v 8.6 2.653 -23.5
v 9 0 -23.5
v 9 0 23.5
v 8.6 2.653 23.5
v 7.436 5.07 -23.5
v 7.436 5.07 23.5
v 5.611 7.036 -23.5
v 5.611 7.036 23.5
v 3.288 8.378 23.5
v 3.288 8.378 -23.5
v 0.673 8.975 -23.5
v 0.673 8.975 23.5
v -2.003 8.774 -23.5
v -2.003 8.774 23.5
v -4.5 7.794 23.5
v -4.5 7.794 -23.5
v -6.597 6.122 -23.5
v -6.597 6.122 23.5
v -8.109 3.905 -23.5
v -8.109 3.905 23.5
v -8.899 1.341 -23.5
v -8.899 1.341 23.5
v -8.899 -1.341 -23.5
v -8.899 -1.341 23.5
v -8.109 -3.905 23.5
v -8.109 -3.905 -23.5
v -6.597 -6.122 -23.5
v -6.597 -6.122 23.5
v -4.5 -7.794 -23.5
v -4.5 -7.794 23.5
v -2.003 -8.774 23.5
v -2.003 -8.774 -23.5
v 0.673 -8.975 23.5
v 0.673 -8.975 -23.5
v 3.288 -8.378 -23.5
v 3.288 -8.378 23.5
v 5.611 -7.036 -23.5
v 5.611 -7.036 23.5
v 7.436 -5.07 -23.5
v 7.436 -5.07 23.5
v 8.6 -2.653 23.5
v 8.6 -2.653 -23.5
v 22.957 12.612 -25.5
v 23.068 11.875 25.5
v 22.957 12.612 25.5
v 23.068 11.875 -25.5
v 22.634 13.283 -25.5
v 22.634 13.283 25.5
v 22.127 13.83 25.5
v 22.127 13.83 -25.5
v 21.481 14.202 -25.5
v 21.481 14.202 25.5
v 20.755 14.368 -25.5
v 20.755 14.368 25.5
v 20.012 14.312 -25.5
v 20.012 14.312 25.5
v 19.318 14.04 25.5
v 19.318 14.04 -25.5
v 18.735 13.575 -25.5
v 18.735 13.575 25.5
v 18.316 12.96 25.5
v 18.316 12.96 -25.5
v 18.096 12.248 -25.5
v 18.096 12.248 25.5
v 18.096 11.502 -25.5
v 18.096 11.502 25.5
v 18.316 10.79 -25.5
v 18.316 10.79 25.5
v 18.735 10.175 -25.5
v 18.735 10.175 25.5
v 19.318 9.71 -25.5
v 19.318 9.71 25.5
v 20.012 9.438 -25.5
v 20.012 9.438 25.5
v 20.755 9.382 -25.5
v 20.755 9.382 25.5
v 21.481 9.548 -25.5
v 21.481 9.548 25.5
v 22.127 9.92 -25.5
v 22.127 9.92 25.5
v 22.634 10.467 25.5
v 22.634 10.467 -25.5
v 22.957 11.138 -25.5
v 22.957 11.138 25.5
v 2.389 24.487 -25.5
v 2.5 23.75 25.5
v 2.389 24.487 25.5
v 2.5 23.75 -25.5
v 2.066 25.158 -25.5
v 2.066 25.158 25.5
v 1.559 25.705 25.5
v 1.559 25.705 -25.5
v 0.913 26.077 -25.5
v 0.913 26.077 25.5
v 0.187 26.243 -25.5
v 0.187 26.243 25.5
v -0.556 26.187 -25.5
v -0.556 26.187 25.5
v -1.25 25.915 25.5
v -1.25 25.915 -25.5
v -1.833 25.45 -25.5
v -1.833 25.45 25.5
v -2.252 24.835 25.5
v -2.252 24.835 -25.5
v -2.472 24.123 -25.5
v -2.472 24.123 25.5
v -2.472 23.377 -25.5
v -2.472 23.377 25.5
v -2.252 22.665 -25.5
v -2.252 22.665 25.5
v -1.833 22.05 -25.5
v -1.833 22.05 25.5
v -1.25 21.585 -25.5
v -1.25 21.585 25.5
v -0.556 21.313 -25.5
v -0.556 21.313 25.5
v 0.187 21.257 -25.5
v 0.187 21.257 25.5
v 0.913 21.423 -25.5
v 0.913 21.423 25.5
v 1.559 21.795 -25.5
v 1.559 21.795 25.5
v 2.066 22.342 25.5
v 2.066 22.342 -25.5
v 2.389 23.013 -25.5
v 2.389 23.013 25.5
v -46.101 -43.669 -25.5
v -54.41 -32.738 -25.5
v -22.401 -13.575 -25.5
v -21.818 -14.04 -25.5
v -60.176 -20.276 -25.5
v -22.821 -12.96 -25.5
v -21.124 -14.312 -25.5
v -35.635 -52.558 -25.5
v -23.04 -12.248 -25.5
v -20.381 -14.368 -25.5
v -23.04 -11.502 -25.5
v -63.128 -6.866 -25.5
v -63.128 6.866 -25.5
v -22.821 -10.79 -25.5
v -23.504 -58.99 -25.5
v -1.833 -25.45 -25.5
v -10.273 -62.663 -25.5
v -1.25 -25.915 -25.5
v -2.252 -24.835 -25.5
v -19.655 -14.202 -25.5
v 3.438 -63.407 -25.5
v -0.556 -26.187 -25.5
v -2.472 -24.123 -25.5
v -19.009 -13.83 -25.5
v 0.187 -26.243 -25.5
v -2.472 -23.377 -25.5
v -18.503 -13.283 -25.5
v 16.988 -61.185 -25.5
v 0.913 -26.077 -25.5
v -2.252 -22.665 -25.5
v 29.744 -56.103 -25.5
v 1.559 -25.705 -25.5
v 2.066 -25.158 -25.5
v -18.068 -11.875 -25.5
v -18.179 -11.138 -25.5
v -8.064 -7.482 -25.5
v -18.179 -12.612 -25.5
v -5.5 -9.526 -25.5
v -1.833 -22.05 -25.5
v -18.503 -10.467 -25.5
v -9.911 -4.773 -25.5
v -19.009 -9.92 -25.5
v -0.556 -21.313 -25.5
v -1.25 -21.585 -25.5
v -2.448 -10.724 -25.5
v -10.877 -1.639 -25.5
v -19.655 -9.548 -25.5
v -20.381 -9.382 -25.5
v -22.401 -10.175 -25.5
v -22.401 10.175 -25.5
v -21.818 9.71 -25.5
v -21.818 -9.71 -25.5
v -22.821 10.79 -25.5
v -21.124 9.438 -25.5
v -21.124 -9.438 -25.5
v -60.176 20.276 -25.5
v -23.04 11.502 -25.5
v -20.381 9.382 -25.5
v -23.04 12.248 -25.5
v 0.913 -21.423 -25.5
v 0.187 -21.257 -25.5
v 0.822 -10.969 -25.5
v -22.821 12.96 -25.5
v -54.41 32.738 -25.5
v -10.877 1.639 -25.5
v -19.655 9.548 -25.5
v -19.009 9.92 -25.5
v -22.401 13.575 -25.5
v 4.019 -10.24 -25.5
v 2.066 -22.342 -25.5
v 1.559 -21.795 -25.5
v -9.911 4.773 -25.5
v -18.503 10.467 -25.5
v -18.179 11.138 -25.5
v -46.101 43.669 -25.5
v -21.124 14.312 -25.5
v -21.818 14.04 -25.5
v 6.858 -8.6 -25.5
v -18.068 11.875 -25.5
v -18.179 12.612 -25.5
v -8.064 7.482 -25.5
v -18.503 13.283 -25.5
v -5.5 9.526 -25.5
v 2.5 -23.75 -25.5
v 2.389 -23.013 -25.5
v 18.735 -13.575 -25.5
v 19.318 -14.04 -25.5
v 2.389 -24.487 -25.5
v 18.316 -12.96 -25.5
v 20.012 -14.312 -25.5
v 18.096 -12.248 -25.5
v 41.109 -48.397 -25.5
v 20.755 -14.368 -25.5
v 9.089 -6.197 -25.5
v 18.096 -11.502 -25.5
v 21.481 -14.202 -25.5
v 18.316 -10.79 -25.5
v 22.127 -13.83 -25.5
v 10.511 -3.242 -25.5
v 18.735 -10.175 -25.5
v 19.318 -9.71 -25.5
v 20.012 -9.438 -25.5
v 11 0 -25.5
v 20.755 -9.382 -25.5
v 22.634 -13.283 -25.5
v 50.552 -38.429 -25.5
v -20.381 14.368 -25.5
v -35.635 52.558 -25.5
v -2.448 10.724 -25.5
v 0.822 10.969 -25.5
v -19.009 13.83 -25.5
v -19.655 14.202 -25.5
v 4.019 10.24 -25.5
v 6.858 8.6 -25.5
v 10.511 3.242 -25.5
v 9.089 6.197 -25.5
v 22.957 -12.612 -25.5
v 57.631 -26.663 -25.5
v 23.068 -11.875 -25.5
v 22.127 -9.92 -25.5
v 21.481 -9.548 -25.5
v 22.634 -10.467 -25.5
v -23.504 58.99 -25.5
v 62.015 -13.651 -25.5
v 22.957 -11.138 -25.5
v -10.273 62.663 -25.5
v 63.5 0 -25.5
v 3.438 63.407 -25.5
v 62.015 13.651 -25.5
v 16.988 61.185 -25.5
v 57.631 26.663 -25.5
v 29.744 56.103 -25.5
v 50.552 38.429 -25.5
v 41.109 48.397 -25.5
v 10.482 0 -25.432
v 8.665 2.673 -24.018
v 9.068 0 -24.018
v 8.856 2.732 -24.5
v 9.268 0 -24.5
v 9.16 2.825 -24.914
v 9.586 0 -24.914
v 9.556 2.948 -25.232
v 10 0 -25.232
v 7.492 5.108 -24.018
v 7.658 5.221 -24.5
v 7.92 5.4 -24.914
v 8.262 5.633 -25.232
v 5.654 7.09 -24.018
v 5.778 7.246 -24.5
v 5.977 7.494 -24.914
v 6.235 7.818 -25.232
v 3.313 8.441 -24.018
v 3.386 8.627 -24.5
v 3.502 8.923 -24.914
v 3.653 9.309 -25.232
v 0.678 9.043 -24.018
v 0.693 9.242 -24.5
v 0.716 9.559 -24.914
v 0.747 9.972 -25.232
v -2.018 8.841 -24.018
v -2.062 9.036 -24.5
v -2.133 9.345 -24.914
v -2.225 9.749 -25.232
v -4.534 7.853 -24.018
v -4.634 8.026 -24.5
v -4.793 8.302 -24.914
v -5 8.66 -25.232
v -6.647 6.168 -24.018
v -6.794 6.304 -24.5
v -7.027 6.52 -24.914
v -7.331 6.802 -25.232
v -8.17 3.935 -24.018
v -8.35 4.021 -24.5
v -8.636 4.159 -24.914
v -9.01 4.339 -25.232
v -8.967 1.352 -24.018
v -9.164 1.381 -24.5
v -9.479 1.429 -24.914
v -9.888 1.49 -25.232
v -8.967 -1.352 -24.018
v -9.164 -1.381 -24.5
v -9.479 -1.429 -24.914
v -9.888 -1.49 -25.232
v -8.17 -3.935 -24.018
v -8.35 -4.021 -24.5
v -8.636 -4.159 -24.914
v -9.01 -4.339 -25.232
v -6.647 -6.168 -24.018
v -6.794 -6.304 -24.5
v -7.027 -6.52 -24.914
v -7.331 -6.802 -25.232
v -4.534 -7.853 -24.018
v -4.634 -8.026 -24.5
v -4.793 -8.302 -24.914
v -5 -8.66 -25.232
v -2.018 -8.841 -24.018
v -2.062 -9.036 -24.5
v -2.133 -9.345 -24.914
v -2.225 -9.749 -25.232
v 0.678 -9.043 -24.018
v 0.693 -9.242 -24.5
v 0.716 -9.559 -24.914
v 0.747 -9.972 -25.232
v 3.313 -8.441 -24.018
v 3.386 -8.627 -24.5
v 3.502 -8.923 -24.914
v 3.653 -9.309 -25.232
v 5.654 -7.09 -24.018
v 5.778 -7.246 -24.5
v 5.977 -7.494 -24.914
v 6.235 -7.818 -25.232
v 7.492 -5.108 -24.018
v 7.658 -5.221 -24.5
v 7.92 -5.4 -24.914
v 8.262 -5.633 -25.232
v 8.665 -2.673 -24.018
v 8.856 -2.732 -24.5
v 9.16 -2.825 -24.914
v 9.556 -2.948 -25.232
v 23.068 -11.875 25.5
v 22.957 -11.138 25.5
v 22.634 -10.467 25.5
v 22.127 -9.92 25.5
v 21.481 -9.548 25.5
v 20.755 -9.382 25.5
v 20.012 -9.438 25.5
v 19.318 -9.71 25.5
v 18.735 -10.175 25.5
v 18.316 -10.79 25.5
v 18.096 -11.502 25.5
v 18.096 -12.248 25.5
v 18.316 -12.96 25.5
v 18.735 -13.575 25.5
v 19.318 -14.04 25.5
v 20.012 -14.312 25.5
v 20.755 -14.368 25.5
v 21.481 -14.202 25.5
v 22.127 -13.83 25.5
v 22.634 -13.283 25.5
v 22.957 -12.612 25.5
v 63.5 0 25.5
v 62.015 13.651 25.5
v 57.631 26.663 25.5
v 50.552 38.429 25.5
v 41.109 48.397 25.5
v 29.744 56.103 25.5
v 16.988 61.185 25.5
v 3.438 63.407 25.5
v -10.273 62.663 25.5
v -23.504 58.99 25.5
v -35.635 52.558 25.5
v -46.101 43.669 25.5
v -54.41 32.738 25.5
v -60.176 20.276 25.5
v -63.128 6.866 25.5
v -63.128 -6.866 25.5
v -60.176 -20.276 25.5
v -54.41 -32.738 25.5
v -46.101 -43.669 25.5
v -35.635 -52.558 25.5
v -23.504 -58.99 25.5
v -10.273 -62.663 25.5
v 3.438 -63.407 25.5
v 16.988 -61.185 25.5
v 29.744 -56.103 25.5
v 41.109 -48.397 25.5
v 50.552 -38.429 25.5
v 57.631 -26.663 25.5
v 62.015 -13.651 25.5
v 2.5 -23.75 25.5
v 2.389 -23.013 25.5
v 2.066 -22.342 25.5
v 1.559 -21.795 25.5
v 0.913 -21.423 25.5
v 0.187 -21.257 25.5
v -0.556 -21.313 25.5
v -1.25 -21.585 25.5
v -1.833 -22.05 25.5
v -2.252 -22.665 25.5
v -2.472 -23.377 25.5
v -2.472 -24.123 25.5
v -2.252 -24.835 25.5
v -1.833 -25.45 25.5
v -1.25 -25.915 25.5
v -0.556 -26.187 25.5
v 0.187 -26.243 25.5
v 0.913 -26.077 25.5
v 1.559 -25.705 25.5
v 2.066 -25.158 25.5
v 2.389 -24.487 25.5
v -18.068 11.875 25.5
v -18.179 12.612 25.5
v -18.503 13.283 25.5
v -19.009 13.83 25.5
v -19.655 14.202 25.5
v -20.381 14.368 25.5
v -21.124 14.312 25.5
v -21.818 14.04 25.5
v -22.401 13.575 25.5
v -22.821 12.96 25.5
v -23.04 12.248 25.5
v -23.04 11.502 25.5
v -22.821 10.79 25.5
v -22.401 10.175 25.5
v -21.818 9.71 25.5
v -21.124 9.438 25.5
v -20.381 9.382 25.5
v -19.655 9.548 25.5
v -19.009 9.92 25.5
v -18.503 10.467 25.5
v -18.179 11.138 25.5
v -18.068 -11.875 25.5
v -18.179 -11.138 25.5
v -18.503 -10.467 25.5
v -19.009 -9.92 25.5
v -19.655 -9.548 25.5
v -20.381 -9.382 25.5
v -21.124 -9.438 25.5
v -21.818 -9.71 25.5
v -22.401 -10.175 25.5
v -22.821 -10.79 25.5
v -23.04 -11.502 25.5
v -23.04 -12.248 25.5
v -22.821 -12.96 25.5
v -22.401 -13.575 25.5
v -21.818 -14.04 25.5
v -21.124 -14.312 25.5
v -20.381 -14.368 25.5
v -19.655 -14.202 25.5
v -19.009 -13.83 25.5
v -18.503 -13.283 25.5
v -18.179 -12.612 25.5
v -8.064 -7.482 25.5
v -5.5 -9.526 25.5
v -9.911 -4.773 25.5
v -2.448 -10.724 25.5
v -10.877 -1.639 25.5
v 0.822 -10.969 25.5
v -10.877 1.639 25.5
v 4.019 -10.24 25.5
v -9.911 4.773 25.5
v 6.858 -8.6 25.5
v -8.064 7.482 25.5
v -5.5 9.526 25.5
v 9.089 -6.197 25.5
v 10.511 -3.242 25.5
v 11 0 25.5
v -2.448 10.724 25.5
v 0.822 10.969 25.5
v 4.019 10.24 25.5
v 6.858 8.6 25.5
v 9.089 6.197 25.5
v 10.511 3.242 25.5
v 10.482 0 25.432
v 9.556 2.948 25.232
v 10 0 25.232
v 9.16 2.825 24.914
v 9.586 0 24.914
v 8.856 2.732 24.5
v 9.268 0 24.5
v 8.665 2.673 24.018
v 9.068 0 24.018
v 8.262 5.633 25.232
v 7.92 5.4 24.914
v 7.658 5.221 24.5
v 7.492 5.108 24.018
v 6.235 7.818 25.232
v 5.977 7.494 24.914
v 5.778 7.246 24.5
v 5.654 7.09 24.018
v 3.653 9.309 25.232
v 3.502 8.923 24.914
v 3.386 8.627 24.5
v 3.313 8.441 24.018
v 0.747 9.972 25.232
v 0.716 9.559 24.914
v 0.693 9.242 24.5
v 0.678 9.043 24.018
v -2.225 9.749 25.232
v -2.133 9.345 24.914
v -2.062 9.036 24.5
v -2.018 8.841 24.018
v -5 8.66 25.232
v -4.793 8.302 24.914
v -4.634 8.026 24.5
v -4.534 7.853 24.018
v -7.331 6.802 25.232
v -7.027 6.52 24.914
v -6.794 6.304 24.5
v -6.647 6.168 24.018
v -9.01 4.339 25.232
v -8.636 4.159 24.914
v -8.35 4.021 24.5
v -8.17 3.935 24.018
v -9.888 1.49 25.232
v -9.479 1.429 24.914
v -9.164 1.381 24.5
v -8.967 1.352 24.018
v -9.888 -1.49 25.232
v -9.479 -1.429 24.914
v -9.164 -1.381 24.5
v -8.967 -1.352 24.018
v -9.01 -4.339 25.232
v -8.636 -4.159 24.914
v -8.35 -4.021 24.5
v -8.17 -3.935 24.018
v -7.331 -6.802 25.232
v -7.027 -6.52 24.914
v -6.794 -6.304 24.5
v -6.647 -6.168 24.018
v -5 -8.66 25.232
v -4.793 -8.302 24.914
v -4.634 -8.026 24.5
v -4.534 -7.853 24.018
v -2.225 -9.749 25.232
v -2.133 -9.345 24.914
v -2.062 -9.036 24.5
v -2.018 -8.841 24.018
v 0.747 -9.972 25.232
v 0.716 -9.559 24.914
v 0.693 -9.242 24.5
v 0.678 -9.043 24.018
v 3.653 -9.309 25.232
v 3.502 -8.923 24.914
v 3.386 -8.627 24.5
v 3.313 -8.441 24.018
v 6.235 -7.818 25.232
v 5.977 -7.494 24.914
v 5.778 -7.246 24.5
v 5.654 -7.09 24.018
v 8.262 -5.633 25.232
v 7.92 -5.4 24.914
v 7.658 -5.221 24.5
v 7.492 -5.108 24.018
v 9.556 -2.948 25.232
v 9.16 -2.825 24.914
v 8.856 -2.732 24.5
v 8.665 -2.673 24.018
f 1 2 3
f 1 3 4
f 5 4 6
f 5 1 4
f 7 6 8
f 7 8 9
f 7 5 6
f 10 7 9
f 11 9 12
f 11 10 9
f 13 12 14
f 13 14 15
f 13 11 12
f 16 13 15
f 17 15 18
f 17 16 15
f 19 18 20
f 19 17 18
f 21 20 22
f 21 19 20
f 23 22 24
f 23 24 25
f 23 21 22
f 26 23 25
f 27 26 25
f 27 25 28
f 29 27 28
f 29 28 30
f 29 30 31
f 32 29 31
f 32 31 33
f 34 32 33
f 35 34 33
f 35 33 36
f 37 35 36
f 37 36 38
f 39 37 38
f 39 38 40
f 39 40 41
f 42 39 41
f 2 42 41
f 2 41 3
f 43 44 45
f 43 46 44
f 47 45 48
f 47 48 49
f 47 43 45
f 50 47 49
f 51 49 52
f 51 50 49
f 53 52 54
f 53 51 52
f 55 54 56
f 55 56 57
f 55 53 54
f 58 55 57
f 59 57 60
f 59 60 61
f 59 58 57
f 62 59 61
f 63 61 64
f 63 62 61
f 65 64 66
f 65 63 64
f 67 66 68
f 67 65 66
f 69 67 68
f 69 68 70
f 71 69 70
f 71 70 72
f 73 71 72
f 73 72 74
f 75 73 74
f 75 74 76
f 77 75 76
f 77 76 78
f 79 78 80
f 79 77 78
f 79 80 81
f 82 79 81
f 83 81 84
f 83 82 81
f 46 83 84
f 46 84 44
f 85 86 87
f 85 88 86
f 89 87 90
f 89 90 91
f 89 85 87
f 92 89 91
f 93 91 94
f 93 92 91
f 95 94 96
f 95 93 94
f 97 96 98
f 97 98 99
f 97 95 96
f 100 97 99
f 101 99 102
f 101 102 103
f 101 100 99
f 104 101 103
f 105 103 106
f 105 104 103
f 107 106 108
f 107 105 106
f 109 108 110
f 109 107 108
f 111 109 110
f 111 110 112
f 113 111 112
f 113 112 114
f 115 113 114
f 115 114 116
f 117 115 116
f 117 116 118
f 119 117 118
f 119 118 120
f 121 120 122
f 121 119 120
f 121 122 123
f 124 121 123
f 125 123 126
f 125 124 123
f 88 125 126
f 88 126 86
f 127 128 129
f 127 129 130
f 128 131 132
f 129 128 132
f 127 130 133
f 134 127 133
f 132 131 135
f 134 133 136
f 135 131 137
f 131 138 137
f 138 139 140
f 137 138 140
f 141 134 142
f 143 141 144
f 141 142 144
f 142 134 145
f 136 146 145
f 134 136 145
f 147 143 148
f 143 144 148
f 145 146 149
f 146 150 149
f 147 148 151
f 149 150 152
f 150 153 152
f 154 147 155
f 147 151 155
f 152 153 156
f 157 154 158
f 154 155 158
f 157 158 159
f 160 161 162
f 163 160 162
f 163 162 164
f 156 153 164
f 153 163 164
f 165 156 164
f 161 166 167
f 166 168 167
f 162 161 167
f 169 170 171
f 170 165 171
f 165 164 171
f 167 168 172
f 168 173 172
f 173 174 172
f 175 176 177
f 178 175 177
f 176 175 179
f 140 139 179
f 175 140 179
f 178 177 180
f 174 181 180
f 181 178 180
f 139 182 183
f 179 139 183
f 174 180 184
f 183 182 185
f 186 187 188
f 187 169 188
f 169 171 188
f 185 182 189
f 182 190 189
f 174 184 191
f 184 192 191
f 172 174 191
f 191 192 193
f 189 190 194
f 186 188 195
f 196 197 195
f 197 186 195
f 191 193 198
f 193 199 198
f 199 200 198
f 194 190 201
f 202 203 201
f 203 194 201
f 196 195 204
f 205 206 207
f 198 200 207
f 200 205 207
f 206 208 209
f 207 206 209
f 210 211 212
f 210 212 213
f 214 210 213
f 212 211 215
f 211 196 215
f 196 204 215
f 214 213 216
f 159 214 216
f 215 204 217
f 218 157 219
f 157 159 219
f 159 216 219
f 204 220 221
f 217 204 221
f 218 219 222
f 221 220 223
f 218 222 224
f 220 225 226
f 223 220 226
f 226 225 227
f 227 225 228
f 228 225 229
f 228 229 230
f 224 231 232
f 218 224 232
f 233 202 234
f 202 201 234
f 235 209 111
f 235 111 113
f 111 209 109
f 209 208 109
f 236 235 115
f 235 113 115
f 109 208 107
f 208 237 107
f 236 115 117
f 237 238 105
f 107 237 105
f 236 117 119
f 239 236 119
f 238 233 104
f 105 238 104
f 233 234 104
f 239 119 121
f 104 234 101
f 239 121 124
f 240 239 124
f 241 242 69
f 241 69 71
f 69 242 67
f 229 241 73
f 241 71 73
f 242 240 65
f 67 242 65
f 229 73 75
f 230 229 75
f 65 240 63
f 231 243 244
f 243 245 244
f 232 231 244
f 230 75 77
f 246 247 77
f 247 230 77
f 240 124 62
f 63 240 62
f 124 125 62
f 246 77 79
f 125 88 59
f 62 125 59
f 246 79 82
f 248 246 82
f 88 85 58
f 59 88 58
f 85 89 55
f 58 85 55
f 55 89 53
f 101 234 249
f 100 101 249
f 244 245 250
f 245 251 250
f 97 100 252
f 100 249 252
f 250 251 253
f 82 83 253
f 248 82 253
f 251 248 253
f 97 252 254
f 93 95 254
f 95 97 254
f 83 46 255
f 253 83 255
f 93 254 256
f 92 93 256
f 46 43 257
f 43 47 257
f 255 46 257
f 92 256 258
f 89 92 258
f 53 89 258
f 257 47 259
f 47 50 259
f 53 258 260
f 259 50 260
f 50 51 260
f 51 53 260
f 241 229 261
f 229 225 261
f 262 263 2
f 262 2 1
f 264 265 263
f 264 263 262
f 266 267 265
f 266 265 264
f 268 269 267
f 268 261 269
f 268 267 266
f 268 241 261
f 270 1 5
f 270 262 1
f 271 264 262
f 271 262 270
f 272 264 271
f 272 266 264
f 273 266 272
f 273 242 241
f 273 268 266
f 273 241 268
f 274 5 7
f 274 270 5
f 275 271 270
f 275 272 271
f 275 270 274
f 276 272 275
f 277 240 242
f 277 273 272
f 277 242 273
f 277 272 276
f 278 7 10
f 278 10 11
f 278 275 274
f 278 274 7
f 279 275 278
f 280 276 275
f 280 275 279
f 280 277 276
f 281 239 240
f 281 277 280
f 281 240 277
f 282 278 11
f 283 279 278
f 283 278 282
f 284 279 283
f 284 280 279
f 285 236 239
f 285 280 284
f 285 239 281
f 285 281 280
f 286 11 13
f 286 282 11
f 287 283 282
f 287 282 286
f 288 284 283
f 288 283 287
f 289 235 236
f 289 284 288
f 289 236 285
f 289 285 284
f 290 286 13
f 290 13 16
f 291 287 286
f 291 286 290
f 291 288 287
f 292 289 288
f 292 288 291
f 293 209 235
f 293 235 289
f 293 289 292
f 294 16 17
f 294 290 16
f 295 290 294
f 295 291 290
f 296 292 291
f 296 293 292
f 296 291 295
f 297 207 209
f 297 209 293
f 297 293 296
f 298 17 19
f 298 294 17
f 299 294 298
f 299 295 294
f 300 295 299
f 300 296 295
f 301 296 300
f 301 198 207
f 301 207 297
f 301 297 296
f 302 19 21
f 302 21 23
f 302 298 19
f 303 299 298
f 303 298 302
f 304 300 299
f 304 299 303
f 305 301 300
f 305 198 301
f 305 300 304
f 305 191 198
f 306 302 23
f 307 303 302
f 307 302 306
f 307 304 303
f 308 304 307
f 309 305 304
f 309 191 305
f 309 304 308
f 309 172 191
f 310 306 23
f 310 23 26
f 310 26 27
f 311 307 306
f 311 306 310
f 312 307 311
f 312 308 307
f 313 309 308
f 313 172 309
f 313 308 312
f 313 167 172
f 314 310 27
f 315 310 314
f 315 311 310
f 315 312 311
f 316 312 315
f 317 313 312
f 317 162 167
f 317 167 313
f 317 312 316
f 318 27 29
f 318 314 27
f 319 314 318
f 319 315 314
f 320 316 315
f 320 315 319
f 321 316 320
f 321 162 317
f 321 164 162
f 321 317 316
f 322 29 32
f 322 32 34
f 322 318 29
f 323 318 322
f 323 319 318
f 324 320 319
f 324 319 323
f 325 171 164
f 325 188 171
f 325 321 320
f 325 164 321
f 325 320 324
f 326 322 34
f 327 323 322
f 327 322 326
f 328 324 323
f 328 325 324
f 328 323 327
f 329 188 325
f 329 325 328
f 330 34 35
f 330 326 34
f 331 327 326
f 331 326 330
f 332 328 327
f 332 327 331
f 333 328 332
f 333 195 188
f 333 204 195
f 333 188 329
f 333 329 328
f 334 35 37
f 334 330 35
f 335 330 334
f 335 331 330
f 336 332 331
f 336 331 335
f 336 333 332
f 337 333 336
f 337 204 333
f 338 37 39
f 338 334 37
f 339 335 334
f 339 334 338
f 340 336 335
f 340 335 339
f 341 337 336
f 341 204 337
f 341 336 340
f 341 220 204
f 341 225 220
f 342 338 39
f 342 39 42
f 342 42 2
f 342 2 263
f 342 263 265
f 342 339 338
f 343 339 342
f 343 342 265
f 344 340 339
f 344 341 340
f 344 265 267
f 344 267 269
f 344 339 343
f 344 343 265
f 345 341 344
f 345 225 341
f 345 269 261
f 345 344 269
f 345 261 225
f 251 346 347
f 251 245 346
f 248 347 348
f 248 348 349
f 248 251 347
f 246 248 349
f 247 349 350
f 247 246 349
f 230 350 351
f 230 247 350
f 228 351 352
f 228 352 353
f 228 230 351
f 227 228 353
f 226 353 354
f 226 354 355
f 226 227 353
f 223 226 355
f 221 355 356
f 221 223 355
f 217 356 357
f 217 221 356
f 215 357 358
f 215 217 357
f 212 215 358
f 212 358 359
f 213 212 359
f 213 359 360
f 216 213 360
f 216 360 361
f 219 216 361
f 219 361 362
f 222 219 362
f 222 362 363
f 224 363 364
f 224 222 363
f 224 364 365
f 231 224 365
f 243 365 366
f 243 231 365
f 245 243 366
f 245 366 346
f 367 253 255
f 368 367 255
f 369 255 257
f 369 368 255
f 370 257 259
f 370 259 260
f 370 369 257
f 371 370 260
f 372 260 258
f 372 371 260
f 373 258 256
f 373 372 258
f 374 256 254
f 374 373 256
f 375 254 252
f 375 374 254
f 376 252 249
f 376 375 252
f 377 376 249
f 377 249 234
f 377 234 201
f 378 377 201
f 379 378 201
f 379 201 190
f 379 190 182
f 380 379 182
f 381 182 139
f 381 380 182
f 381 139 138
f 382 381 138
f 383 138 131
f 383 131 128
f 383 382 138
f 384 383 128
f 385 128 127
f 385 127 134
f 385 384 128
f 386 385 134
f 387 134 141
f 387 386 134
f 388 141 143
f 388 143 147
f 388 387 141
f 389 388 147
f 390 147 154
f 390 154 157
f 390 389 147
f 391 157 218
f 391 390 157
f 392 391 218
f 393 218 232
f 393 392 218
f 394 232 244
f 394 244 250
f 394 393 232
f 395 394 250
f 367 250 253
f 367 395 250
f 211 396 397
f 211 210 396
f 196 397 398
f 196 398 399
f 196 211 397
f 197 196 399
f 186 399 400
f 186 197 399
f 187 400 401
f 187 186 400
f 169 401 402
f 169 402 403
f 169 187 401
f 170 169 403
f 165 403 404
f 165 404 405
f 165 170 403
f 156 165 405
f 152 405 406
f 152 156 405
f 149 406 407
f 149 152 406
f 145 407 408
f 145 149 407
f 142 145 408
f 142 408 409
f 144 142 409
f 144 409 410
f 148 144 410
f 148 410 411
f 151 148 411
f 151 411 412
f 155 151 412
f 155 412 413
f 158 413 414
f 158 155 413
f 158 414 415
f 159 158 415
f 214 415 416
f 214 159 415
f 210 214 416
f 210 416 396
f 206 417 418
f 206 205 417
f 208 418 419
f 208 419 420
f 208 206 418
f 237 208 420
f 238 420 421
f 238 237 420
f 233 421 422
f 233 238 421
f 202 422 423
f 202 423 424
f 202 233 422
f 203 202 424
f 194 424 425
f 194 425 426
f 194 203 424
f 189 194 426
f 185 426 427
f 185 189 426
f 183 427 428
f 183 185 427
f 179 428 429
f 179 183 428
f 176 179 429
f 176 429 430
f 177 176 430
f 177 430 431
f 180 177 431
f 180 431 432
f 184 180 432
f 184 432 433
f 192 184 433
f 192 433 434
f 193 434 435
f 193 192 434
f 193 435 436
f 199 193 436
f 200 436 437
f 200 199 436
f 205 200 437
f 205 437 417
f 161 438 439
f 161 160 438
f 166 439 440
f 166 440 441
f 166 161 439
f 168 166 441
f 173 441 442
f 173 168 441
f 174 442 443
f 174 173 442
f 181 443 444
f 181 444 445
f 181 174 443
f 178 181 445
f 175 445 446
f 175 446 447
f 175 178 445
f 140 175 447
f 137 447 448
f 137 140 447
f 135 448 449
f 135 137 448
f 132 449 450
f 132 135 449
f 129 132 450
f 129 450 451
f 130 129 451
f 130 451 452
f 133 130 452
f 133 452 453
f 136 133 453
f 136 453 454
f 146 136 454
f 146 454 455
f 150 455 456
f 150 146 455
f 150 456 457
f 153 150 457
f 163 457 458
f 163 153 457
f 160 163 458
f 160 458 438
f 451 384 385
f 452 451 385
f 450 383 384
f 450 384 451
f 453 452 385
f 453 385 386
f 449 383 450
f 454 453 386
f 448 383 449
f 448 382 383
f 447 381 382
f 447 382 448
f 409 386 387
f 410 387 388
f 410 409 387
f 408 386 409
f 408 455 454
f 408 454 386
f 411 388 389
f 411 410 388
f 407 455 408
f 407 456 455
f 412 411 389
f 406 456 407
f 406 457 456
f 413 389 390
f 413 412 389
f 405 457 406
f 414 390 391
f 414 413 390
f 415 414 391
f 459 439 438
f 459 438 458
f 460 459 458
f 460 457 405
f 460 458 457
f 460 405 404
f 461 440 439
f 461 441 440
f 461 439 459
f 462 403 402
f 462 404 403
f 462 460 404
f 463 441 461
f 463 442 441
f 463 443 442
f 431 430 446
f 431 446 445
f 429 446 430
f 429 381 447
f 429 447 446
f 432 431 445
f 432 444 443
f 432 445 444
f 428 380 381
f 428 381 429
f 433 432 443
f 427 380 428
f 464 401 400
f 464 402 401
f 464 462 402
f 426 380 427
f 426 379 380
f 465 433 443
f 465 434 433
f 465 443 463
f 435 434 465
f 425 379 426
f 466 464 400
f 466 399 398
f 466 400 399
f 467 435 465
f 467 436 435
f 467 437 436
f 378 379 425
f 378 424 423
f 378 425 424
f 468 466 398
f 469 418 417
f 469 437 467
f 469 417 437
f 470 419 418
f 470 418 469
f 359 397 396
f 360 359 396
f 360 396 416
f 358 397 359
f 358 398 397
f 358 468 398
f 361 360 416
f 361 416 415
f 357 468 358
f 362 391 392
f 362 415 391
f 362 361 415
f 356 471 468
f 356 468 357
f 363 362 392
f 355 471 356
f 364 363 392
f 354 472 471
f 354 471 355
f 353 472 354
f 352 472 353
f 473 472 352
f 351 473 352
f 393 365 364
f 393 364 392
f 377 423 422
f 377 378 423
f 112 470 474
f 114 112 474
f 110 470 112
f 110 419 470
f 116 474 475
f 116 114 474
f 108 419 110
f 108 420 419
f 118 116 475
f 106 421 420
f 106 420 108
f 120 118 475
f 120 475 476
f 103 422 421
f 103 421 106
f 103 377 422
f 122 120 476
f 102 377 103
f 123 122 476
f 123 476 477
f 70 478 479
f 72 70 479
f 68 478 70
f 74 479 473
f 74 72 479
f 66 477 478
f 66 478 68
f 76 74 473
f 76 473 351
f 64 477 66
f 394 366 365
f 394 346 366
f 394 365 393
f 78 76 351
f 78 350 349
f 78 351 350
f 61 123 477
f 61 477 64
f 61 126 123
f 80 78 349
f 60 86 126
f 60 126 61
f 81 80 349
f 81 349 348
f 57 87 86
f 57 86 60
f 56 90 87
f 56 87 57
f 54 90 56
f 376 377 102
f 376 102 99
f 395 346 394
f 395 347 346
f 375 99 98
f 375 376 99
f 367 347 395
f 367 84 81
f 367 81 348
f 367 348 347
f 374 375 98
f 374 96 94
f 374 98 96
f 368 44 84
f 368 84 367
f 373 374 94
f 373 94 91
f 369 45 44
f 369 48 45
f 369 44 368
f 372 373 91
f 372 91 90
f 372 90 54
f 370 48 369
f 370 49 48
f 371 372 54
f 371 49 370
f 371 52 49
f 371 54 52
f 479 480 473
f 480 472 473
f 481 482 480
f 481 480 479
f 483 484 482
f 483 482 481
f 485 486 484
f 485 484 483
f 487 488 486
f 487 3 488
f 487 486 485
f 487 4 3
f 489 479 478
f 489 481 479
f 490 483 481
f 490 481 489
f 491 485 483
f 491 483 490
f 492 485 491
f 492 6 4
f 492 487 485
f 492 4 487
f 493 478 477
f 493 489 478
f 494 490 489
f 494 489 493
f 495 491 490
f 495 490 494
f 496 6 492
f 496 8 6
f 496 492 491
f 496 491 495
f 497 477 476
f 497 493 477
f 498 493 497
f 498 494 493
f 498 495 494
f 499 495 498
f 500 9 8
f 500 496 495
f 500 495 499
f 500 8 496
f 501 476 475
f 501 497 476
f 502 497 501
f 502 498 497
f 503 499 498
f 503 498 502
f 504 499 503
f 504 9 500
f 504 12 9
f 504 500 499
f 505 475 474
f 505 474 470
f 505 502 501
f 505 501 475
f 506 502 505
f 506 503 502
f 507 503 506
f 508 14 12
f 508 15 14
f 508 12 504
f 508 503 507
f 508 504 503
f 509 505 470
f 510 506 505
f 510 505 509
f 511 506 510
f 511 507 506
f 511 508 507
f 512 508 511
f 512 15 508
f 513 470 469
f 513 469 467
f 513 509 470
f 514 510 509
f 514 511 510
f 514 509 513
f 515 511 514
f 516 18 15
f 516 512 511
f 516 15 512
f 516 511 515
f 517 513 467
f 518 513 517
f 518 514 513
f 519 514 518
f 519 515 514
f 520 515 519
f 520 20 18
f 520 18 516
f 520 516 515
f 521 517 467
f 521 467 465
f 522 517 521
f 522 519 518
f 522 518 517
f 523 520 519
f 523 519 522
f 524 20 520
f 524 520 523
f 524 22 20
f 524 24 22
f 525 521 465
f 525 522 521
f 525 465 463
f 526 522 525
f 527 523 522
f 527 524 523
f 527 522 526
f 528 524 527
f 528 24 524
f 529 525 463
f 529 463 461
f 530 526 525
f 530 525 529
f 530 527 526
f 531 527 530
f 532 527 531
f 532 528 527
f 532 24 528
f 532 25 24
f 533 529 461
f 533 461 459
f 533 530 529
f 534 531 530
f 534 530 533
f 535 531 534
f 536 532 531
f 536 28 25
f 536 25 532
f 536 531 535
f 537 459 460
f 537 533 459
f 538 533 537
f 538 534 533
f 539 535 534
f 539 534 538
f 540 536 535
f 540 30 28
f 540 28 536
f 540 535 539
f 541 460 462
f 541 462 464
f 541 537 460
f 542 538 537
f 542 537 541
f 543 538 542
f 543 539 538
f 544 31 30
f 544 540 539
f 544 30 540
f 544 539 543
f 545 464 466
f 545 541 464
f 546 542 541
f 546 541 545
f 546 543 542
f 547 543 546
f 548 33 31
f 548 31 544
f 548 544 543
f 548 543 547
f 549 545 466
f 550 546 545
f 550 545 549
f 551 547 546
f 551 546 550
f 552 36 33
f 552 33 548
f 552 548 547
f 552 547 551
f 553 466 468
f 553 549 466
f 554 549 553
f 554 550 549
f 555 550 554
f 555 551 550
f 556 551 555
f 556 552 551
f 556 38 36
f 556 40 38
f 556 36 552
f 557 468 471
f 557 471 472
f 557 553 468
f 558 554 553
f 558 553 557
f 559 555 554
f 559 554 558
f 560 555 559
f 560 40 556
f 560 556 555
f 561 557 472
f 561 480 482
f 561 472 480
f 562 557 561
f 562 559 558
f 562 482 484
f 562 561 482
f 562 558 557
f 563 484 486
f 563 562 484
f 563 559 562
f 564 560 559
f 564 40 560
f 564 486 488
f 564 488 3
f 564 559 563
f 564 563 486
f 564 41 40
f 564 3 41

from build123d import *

# Parameters (mm, degrees)
SKETCH1_R           = 63.5
SKETCH1_R_2         = 9
SKETCH1_R_3         = 2.5
BOSS_EXTRUDE1_DEPTH = 25.5
FILLET1_R           = 2


with BuildPart() as part:
    # Sketch1 → Boss-Extrude1 (new, symmetric)
    with BuildSketch(Plane.XY):
        Circle(SKETCH1_R)
        Circle(SKETCH1_R_2, mode=Mode.SUBTRACT)
        with Locations((0, 23.75)):
            Circle(SKETCH1_R_3, mode=Mode.SUBTRACT)
        with Locations((20.56810334, 11.875)):
            Circle(SKETCH1_R_3, mode=Mode.SUBTRACT)
        with Locations((20.56810334, -11.875)):
            Circle(SKETCH1_R_3, mode=Mode.SUBTRACT)
        with Locations((0, -23.75)):
            Circle(SKETCH1_R_3, mode=Mode.SUBTRACT)
        with Locations((-20.56810334, -11.875)):
            Circle(SKETCH1_R_3, mode=Mode.SUBTRACT)
        with Locations((-20.56810334, 11.875)):
            Circle(SKETCH1_R_3, mode=Mode.SUBTRACT)
    extrude(amount=BOSS_EXTRUDE1_DEPTH, both=True)

    # Fillet1
    fillet1_edges = [part.edges().sort_by_distance(p)[0] for p in [
        (-9, 0, -25.5),
        (-9, 0, 25.5),
    ]]
    fillet(fillet1_edges, radius=FILLET1_R)


solid = part.part
